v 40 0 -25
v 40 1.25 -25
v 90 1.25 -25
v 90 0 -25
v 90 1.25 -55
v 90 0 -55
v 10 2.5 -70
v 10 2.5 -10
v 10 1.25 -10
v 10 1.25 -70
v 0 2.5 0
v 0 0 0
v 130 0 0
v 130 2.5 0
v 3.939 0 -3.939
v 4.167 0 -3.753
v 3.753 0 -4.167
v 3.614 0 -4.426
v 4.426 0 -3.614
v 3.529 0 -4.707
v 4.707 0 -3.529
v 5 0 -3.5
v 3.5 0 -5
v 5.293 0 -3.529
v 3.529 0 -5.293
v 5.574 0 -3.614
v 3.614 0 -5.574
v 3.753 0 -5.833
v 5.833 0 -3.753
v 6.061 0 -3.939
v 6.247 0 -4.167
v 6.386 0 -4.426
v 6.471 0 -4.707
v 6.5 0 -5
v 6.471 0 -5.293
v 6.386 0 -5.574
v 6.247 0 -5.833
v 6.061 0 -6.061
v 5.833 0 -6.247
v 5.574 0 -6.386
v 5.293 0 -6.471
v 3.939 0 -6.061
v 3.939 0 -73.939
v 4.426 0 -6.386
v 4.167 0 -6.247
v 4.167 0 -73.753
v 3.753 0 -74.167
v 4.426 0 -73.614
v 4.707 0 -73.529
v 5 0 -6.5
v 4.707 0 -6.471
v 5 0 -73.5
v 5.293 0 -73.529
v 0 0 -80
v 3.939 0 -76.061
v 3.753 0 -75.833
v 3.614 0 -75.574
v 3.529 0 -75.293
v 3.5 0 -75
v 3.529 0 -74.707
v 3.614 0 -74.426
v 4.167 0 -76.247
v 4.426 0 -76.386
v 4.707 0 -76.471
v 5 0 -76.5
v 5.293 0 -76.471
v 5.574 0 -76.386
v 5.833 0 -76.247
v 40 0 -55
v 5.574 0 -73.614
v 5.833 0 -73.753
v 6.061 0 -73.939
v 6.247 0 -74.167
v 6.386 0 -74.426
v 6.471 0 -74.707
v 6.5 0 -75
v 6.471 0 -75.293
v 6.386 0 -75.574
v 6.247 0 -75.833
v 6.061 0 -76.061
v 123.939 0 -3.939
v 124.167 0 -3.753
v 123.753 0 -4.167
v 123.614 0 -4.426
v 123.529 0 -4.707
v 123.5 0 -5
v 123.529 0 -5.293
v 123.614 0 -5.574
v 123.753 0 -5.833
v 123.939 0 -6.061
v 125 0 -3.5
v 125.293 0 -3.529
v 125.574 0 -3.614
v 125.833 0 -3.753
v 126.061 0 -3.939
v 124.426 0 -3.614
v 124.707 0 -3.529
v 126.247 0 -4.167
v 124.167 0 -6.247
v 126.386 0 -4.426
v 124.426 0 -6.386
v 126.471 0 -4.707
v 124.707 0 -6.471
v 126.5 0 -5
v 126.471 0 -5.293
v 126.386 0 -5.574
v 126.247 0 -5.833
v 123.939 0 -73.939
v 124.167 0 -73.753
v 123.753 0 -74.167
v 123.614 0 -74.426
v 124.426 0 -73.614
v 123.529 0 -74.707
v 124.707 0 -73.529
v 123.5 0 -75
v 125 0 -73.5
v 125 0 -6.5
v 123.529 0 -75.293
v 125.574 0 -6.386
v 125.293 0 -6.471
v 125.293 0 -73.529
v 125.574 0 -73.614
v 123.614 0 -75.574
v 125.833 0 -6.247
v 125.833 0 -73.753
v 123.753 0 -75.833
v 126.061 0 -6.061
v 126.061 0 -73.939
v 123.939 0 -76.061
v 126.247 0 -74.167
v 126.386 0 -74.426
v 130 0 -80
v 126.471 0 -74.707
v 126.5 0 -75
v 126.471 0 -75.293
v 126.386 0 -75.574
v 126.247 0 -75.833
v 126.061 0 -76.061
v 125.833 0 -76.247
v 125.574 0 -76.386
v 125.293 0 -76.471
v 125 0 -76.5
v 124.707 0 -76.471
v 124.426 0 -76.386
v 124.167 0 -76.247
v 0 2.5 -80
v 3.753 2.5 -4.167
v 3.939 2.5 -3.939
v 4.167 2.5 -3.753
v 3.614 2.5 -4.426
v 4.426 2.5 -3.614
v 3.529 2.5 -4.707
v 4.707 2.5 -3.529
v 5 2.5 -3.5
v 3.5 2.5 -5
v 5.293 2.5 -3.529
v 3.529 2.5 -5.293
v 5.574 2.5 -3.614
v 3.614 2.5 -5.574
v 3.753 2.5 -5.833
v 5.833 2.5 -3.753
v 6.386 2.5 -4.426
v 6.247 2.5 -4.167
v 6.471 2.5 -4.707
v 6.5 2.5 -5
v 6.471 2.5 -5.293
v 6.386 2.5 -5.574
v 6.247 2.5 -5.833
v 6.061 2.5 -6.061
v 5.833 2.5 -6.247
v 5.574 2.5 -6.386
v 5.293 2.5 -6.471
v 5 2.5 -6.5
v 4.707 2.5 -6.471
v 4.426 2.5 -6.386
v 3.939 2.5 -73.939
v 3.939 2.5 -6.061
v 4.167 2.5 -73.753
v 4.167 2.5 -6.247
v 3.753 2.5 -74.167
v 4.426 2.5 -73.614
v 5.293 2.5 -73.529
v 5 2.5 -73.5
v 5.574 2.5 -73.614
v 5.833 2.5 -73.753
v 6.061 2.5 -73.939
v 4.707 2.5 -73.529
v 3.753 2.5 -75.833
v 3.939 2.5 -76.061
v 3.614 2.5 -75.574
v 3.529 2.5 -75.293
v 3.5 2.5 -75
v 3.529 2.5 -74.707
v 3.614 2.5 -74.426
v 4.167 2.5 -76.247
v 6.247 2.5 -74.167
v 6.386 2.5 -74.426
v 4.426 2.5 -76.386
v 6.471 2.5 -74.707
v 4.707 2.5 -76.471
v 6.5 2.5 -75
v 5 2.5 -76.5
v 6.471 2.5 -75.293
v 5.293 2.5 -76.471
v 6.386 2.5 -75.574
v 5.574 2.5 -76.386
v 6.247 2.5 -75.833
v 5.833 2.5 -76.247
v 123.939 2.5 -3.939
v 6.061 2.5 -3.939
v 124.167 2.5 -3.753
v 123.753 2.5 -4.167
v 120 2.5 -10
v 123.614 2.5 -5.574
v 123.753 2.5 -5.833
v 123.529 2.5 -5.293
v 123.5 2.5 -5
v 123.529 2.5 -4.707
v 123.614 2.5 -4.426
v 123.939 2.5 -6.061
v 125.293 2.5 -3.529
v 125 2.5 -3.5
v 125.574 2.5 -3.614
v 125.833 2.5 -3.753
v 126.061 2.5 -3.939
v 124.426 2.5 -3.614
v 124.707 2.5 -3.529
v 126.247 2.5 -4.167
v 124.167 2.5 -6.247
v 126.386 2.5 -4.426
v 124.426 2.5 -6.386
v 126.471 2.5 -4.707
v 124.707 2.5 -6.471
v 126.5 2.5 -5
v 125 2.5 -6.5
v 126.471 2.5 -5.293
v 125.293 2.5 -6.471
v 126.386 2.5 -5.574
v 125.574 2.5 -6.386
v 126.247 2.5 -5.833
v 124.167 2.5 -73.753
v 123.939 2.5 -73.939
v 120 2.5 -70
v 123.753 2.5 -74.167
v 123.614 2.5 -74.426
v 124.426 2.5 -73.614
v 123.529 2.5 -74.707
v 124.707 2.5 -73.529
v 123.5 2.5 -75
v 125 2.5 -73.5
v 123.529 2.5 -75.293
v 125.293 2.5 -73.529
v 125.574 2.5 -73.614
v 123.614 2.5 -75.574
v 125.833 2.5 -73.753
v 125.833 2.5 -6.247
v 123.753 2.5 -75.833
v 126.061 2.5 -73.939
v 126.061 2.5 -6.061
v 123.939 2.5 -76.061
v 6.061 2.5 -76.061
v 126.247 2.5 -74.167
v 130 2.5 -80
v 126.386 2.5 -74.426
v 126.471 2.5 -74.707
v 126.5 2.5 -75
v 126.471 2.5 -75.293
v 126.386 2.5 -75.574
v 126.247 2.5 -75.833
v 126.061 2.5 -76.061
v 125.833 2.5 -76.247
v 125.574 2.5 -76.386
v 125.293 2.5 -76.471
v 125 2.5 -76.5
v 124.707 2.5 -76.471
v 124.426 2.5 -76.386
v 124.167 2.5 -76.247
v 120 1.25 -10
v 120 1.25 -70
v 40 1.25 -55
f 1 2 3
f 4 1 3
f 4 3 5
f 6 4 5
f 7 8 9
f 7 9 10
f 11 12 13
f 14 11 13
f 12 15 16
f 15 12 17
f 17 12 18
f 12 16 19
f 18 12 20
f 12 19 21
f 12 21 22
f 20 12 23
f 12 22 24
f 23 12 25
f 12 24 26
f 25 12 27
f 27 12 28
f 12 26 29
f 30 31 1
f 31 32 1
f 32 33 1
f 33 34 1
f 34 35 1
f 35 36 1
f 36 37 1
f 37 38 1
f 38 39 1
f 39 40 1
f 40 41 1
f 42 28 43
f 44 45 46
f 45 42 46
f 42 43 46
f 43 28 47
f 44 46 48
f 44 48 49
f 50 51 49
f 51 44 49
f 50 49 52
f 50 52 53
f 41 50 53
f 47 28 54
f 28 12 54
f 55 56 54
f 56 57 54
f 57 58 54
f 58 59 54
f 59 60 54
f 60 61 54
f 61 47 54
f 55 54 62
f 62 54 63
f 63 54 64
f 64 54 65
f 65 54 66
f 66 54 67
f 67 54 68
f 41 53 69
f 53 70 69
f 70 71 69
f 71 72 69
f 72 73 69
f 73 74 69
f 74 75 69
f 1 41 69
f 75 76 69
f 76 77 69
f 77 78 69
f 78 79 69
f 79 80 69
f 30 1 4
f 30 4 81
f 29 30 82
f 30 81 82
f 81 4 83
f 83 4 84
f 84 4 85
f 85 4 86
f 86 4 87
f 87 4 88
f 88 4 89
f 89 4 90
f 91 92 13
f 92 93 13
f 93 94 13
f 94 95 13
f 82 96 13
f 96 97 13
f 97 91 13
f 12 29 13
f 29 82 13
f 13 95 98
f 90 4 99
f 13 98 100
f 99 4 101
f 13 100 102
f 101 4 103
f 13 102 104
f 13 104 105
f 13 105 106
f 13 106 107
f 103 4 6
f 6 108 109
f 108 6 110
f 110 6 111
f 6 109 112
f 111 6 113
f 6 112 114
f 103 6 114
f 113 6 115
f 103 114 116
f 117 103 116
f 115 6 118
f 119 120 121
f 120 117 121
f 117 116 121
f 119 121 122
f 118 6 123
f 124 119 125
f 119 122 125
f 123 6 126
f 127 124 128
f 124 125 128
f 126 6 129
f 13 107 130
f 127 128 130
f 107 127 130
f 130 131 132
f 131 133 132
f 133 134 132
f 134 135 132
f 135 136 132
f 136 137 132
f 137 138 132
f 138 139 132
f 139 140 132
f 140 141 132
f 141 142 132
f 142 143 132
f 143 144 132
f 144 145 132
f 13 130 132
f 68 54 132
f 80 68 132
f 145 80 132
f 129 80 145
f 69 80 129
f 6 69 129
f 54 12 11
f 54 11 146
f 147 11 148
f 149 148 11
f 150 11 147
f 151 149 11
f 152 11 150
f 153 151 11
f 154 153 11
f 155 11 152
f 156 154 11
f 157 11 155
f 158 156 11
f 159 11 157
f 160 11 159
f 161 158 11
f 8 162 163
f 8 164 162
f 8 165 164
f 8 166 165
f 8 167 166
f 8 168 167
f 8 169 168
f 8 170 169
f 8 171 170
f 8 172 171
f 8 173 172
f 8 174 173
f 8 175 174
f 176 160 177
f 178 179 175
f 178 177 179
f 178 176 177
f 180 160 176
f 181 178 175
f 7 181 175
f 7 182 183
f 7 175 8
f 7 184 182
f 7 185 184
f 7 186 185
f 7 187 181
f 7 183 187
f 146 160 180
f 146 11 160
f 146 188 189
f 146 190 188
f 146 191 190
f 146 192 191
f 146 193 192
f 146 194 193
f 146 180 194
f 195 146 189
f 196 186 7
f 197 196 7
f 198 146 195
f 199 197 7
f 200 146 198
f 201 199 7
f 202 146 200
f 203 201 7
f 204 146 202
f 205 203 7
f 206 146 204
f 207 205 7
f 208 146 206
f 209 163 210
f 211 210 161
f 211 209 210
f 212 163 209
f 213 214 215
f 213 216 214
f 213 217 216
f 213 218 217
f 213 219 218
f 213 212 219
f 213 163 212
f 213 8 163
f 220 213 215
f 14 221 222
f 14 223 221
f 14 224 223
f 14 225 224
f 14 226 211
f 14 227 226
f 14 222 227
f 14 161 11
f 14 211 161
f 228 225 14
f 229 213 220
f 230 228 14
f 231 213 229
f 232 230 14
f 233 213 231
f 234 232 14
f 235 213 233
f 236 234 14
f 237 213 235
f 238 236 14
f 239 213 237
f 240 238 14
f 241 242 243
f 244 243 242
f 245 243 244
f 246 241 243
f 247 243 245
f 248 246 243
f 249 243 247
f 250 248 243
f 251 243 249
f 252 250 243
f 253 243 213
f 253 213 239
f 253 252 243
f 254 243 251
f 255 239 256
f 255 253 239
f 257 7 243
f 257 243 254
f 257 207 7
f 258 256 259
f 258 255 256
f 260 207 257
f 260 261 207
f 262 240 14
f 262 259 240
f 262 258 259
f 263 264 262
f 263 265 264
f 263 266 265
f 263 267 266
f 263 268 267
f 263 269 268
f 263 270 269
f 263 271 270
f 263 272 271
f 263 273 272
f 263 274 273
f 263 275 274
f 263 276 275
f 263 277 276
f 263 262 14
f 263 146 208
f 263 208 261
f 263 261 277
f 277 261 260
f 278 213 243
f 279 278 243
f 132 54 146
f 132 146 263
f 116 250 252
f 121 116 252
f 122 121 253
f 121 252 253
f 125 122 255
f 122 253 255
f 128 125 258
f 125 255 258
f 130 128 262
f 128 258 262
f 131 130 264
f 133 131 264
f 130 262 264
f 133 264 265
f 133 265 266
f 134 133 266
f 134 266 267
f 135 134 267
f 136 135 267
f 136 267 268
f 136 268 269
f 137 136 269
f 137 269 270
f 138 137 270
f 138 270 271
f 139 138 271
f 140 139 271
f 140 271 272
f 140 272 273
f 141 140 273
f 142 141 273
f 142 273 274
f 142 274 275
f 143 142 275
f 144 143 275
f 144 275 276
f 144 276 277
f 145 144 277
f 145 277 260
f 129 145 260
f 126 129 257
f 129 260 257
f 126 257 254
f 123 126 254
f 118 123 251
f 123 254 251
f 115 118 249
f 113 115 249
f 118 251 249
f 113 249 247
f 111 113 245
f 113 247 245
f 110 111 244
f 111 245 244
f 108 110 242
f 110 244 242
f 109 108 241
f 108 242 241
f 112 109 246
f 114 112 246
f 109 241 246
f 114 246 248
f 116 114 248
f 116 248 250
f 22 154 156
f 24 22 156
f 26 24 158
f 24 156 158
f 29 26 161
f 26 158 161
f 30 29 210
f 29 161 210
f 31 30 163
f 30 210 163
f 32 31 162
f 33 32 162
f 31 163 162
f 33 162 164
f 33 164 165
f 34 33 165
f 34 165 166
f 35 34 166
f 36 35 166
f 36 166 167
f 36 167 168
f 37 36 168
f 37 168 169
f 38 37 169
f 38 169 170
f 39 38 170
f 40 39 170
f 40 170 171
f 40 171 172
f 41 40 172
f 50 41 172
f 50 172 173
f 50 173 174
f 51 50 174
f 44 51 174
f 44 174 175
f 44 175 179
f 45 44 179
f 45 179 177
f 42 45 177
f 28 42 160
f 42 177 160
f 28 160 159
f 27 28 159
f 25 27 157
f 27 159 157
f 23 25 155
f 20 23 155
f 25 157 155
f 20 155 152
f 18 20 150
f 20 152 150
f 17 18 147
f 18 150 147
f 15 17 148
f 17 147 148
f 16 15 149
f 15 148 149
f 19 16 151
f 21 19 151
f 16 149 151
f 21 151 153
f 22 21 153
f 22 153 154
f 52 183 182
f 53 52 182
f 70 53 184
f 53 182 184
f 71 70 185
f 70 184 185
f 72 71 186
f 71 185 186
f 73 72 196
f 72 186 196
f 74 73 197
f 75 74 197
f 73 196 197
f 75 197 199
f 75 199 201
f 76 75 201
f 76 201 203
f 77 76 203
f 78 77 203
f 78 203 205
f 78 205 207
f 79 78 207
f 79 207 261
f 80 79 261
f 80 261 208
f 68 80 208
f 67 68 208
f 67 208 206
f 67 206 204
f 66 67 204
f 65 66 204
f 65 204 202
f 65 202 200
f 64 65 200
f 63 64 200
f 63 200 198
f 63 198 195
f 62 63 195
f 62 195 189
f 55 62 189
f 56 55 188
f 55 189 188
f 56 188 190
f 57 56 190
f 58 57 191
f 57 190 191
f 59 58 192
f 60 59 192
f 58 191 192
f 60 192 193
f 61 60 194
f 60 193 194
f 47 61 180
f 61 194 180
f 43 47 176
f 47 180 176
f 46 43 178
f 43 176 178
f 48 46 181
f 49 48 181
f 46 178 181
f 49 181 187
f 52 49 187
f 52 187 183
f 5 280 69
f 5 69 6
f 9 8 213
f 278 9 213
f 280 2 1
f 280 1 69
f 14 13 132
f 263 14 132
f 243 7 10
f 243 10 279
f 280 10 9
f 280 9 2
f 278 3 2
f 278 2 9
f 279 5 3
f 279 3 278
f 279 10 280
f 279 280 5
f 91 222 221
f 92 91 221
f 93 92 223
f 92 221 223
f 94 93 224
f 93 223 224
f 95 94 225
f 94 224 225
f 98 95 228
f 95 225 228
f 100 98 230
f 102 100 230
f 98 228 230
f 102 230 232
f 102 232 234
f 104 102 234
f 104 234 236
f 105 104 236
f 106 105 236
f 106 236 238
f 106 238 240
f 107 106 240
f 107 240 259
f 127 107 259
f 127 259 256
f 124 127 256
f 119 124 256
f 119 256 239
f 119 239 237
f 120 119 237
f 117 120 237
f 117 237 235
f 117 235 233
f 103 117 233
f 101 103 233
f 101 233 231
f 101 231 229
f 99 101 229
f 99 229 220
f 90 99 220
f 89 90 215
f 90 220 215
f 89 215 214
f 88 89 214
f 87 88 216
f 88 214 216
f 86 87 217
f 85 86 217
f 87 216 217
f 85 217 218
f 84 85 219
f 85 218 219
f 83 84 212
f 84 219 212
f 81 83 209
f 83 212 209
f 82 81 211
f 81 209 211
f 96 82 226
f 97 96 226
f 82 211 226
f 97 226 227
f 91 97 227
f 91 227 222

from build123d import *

# Parameters (mm, degrees)
SKETCH1_W           = 130
SKETCH1_H           = 80
BOSS_EXTRUDE1_DEPTH = 2.5
SKETCH2_W           = 110
SKETCH2_H           = 60
CUT_EXTRUDE1_DEPTH  = 1.25
SKETCH3_R           = 1.5
CUT_EXTRUDE2_DEPTH  = 153.663846408
SKETCH4_W           = 50
SKETCH4_H           = 30
CUT_EXTRUDE3_DEPTH  = 153.648493278


with BuildPart() as part:
    # Sketch1 → Boss-Extrude1 (new body)
    with BuildSketch(Plane(origin=(0, 0, 0), x_dir=(1, 0, 0), z_dir=(0, 1, 0))):
        with Locations((65, 40)):
            Rectangle(SKETCH1_W, SKETCH1_H)
    extrude(amount=BOSS_EXTRUDE1_DEPTH)

    # Sketch2 → Cut-Extrude1 (cut)
    with BuildSketch(Plane(origin=(0, 2.5, 0), x_dir=(1, 0, 0), z_dir=(0, 1, 0))):
        with Locations((65, 40)):
            Rectangle(SKETCH2_W, SKETCH2_H)
    extrude(amount=-CUT_EXTRUDE1_DEPTH, mode=Mode.SUBTRACT)

    # Sketch3 → Cut-Extrude2 (cut, through all)
    with BuildSketch(Plane(origin=(0, 2.5, 0), x_dir=(1, 0, 0), z_dir=(0, 1, 0))):
        with Locations(Location((5, 75, 0), (0, 0, 270))):
            Circle(SKETCH3_R)
        with Locations(Location((125, 75, 0), (0, 0, 270))):
            Circle(SKETCH3_R)
        with Locations(Location((125, 5, 0), (0, 0, 270))):
            Circle(SKETCH3_R)
        with Locations(Location((5, 5, 0), (0, 0, 270))):
            Circle(SKETCH3_R)
    extrude(amount=-CUT_EXTRUDE2_DEPTH, mode=Mode.SUBTRACT)

    # Sketch4 → Cut-Extrude3 (cut, through all)
    with BuildSketch(Plane(origin=(0, 1.25, 0), x_dir=(1, 0, 0), z_dir=(0, 1, 0))):
        with Locations((65, 40)):
            Rectangle(SKETCH4_W, SKETCH4_H)
    extrude(amount=-CUT_EXTRUDE3_DEPTH, mode=Mode.SUBTRACT)


solid = part.part
